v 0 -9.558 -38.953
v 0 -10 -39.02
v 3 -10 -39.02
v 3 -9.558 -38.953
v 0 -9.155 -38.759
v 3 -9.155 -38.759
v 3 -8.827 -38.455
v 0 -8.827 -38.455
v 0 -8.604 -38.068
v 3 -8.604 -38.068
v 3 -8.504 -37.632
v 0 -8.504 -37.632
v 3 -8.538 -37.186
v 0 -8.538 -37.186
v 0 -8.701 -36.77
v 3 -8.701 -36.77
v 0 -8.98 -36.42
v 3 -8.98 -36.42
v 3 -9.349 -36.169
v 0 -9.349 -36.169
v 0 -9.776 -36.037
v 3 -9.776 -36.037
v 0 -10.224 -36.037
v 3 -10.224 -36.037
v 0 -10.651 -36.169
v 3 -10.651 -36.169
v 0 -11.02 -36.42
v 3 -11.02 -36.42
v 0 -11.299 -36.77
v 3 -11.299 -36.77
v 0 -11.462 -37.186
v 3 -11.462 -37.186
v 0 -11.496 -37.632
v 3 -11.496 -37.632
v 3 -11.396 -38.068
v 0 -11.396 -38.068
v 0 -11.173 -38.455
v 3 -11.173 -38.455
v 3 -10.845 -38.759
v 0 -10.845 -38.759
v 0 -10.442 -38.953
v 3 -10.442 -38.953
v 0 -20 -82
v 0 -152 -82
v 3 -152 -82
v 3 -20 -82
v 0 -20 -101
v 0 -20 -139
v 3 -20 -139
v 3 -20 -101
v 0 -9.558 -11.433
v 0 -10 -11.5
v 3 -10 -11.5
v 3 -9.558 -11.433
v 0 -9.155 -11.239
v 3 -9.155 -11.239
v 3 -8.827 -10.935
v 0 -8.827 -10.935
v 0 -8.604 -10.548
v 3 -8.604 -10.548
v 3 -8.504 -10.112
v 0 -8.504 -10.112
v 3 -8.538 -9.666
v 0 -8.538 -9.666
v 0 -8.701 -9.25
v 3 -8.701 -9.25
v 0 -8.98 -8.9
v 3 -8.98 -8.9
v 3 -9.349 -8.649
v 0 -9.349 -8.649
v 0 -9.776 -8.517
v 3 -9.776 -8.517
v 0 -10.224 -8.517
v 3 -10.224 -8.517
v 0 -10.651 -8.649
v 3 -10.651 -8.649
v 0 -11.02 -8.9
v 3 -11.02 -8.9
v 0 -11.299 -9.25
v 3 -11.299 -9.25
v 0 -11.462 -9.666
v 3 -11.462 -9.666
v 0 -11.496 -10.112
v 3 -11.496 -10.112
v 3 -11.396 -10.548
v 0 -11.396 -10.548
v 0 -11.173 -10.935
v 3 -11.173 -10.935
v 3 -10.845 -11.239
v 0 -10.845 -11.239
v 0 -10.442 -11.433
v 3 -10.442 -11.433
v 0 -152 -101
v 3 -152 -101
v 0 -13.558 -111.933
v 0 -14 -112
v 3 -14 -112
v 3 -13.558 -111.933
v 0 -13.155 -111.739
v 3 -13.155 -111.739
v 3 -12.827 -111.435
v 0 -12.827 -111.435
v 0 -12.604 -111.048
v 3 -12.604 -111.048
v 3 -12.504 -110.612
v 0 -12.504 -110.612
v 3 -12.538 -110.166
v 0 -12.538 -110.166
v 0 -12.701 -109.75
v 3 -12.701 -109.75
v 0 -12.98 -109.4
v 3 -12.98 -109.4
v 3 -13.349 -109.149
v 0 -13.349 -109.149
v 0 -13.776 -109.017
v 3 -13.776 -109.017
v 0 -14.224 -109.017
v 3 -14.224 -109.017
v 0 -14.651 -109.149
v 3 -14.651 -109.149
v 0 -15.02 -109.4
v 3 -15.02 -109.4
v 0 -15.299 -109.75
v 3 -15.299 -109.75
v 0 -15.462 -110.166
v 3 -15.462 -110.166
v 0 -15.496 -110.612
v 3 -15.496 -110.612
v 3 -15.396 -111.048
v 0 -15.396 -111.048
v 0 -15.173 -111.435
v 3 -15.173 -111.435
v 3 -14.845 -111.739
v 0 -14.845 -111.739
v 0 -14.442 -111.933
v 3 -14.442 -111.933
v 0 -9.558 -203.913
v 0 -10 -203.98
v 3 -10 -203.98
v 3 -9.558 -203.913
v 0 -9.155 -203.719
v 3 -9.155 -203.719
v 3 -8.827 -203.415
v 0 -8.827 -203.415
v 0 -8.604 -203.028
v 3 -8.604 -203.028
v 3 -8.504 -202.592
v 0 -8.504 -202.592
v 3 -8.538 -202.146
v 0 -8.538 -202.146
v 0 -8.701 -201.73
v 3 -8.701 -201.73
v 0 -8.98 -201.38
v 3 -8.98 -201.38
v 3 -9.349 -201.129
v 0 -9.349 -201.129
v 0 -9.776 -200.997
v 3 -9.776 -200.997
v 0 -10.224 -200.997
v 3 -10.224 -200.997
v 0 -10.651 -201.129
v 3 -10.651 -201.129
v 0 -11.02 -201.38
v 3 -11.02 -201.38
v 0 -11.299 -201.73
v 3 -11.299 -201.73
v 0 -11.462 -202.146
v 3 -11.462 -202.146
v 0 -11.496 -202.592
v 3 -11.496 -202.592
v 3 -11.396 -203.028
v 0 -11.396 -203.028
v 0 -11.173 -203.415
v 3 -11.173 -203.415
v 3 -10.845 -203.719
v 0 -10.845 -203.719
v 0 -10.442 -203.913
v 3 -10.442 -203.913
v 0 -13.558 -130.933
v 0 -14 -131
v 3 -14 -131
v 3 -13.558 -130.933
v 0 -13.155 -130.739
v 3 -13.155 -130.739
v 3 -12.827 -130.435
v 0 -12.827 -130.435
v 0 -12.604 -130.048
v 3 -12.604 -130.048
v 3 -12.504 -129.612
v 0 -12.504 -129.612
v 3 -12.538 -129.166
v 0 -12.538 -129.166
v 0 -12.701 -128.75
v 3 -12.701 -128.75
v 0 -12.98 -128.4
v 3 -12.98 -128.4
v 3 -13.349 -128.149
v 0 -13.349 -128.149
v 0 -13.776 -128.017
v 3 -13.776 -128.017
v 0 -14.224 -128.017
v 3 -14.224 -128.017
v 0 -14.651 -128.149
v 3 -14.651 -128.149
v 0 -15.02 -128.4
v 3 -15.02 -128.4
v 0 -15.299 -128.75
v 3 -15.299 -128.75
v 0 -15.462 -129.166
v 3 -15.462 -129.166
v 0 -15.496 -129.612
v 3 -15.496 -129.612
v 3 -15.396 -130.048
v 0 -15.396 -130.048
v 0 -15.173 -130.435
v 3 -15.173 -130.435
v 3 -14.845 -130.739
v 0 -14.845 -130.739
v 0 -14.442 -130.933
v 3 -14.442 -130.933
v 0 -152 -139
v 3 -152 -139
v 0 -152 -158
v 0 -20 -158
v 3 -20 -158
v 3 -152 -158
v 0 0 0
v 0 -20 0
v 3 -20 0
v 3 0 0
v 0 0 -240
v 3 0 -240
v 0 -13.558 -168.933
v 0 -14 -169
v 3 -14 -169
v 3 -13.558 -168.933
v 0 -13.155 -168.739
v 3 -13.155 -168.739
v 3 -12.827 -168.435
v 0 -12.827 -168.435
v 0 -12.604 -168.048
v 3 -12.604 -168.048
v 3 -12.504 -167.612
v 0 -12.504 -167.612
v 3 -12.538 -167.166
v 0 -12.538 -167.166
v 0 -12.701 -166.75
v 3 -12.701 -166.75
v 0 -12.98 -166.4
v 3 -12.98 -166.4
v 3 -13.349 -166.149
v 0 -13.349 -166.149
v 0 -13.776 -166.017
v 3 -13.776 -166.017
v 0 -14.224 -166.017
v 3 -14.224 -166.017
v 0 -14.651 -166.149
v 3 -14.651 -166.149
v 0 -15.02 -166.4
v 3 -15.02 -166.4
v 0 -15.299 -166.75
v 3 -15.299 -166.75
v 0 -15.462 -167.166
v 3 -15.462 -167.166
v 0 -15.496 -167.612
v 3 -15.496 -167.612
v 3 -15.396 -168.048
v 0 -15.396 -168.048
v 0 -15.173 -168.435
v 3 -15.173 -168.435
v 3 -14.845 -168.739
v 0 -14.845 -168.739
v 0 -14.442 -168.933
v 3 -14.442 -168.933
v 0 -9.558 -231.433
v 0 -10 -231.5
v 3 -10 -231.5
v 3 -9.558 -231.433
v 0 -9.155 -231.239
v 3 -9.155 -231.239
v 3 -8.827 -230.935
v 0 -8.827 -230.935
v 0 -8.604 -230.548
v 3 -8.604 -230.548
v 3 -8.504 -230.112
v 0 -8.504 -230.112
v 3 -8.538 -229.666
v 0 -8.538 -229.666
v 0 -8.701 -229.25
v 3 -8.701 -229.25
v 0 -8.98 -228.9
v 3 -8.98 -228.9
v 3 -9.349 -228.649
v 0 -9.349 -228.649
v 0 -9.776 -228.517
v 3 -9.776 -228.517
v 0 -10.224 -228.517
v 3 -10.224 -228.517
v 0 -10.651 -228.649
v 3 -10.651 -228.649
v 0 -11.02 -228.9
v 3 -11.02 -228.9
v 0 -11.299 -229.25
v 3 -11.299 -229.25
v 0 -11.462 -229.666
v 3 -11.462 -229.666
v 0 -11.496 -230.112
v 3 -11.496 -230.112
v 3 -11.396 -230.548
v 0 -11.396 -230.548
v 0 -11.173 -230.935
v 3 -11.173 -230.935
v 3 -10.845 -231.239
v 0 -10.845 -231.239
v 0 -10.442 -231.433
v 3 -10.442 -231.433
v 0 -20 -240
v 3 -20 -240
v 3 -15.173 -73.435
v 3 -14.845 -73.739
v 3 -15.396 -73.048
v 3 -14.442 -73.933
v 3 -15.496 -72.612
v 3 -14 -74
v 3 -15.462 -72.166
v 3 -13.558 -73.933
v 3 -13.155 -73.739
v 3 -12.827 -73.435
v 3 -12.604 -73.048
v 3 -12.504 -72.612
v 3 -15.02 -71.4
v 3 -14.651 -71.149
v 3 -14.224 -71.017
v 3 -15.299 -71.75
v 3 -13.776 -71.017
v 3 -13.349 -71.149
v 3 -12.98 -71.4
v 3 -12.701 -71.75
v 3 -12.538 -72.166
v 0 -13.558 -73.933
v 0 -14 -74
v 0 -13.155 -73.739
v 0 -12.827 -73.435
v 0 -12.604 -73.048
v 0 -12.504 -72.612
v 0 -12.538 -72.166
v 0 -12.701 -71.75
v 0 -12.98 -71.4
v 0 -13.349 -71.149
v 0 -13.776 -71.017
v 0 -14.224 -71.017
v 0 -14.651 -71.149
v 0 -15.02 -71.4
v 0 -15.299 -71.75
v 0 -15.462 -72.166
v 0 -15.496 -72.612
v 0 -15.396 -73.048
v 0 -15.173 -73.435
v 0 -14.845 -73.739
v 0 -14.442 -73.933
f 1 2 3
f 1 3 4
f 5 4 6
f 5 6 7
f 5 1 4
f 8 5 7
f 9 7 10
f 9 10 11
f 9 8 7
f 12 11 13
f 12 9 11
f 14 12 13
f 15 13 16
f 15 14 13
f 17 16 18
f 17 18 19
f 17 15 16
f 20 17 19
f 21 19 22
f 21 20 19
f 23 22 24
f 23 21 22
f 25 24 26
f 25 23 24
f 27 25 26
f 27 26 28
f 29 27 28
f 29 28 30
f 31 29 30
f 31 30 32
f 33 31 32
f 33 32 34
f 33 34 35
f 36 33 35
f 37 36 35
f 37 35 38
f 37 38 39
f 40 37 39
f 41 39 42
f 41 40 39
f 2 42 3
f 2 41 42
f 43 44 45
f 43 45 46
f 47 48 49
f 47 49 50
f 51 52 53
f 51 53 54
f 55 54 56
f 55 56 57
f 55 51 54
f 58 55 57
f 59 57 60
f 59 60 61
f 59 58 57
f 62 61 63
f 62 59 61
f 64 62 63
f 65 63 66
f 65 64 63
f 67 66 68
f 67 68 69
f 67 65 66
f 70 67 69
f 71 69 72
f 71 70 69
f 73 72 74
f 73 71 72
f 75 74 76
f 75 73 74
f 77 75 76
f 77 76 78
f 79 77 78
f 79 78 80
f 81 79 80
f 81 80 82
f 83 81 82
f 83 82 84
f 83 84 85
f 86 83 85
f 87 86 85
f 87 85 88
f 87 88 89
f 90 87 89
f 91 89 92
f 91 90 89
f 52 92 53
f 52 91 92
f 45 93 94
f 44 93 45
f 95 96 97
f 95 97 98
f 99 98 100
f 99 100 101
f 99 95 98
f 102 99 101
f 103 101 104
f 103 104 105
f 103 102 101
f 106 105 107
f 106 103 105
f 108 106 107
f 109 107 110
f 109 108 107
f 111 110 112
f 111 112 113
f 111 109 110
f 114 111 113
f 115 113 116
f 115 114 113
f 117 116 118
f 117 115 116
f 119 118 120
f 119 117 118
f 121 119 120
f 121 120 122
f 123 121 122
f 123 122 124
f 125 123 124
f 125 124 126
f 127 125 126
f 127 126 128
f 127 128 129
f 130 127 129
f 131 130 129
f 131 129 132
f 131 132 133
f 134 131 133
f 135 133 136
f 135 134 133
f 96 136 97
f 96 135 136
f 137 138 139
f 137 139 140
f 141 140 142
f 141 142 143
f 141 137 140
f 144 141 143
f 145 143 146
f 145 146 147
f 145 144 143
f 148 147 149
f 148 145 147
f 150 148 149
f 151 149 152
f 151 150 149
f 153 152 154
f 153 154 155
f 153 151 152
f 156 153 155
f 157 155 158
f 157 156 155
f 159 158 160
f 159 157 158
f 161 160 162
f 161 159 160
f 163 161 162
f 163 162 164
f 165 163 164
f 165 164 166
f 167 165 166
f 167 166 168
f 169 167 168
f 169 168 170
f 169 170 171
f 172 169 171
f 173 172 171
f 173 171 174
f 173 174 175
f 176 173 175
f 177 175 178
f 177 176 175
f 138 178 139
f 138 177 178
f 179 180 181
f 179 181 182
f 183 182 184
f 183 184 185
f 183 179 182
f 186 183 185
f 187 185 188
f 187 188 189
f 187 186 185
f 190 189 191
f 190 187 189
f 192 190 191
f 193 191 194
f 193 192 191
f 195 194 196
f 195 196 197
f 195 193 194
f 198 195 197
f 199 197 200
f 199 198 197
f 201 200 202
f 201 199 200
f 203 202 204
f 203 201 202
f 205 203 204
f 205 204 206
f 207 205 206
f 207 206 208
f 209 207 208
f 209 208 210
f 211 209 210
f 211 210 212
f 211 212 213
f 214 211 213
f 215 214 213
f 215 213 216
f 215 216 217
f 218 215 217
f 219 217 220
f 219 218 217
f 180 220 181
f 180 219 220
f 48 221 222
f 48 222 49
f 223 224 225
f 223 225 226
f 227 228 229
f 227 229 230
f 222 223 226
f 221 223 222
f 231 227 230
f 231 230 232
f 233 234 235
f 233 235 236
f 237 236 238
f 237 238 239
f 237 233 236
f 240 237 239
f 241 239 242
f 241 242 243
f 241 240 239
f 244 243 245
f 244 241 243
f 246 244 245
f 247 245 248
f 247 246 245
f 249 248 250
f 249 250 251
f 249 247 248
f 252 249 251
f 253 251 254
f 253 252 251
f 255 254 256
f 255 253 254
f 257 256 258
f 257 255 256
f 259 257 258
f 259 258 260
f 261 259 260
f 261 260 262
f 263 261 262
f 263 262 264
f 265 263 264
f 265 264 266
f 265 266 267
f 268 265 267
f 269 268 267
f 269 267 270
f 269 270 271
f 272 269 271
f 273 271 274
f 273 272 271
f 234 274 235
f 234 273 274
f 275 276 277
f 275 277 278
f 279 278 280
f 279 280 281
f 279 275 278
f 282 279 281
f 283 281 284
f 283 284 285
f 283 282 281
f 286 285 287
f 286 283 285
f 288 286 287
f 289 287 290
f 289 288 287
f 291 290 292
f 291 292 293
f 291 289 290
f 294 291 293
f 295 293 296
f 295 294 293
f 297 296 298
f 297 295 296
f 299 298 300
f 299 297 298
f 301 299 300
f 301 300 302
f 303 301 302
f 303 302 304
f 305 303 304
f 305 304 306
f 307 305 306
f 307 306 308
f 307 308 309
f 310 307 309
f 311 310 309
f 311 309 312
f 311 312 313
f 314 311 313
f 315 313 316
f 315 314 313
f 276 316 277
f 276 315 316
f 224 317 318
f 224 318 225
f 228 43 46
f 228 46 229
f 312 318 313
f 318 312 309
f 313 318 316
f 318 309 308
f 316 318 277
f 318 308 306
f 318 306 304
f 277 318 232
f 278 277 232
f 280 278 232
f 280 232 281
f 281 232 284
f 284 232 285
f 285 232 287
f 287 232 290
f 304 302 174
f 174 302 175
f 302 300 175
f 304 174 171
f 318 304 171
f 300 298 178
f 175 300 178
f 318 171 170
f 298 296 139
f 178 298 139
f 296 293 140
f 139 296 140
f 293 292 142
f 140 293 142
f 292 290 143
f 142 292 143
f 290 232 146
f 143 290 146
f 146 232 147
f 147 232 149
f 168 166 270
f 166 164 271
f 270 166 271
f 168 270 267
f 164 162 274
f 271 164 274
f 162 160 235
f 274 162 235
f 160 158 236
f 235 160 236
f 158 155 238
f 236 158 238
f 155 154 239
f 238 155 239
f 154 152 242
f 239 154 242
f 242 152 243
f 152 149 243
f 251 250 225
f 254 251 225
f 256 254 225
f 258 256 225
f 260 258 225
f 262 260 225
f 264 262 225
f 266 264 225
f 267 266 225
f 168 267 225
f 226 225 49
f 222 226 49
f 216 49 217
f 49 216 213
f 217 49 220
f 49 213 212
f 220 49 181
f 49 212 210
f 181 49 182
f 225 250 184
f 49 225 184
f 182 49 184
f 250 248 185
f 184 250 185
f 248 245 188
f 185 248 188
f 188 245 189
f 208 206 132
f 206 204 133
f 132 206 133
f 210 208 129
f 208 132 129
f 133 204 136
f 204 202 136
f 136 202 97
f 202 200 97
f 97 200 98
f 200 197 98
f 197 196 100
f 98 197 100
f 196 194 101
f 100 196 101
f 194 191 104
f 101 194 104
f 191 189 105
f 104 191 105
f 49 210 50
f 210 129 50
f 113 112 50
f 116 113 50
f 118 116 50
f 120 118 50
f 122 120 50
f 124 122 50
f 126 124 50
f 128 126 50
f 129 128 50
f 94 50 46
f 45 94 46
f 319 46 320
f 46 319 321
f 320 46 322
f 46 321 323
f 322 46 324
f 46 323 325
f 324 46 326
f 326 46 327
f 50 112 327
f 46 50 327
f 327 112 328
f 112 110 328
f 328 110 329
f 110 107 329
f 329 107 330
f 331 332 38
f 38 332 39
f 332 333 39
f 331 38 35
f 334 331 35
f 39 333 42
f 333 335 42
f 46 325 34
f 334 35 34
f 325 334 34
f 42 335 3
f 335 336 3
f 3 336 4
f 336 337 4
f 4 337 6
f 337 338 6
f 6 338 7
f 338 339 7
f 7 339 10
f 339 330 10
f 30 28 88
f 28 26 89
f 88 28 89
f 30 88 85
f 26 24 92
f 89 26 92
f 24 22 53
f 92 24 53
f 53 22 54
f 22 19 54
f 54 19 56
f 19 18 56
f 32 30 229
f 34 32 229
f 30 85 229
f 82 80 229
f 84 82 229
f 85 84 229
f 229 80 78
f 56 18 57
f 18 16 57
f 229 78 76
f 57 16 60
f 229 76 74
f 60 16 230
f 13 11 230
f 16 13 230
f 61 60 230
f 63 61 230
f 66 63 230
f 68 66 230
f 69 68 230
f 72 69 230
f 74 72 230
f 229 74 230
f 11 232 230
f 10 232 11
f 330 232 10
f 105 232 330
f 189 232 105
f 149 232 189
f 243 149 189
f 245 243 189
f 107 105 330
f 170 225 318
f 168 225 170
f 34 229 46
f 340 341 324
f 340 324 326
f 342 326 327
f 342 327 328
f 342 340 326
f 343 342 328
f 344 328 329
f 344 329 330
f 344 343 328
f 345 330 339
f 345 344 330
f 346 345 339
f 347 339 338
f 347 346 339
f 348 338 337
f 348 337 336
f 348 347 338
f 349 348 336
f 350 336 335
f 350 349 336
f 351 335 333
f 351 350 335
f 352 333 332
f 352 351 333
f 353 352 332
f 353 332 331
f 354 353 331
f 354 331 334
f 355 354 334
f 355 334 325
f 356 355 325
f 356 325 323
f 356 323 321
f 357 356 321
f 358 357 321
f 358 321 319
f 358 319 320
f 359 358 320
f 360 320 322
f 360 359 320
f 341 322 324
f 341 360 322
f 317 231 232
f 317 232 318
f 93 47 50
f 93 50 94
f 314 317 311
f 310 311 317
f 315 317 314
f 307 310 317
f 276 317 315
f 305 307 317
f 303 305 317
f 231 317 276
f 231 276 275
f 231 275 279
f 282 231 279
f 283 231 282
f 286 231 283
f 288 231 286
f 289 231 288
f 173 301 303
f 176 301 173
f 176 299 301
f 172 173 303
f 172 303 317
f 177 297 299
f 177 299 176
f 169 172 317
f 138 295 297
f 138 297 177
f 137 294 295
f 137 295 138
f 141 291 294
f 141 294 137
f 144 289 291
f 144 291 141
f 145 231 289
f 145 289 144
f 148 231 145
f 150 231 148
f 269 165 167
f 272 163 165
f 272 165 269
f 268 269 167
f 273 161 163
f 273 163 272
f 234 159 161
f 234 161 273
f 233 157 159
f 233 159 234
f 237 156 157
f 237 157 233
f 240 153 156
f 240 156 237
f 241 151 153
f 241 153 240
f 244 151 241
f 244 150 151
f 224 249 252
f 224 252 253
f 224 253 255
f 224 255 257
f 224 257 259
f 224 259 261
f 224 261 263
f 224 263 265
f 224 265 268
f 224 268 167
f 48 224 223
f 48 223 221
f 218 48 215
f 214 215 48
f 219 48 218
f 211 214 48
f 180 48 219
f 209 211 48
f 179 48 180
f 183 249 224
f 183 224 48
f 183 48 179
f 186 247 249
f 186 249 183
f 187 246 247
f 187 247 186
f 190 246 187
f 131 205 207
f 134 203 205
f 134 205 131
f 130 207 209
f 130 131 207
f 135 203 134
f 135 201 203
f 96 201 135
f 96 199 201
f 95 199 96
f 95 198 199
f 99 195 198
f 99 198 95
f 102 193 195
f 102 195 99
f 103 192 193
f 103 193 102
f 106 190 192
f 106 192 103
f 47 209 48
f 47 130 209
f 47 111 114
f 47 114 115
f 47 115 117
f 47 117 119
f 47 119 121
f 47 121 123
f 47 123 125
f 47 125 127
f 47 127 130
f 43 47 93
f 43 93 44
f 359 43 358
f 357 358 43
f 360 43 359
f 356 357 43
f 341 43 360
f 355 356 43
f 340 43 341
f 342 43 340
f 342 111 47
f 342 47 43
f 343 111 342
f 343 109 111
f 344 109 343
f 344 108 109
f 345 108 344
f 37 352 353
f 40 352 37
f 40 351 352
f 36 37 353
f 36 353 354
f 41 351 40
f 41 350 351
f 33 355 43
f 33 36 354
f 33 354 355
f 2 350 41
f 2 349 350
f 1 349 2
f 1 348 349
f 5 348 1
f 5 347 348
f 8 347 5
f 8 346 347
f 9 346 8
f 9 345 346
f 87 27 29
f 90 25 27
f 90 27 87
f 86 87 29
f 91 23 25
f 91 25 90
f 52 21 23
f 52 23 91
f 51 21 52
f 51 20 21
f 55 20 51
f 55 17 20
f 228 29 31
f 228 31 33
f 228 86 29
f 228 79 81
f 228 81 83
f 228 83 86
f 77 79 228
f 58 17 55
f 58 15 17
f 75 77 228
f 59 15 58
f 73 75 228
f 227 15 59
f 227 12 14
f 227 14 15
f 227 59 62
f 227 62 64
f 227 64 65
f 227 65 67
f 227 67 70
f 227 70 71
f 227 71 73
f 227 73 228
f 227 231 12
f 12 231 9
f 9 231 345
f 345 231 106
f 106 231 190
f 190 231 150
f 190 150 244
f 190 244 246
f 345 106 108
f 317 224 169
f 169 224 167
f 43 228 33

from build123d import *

# Parameters (mm, degrees)
SKETCH_1_R      = 1.5
EXTRUDE_1_DEPTH = 3


with BuildPart() as part:
    # 草图1 → 凸台-拉伸1 (new body)
    with BuildSketch(Plane(origin=(0, 0, 0), x_dir=(0, 0, -1), z_dir=(1, 0, 0))):
        Polygon((0, 0), (240, 0), (240, -20), (158, -20), (158, -152), (139, -152), (139, -20), (101, -20), (101, -152), (82, -152), (82, -20), (0, -20), align=None)
        with Locations((72.5, -14)):
            Circle(SKETCH_1_R, mode=Mode.SUBTRACT)
        with Locations((110.5, -14)):
            Circle(SKETCH_1_R, mode=Mode.SUBTRACT)
        with Locations((129.5, -14)):
            Circle(SKETCH_1_R, mode=Mode.SUBTRACT)
        with Locations((167.5, -14)):
            Circle(SKETCH_1_R, mode=Mode.SUBTRACT)
        with Locations((10, -10)):
            Circle(SKETCH_1_R, mode=Mode.SUBTRACT)
        with Locations((230, -10)):
            Circle(SKETCH_1_R, mode=Mode.SUBTRACT)
        with Locations((37.52, -10)):
            Circle(SKETCH_1_R, mode=Mode.SUBTRACT)
        with Locations((202.48, -10)):
            Circle(SKETCH_1_R, mode=Mode.SUBTRACT)
    extrude(amount=EXTRUDE_1_DEPTH)


solid = part.part
